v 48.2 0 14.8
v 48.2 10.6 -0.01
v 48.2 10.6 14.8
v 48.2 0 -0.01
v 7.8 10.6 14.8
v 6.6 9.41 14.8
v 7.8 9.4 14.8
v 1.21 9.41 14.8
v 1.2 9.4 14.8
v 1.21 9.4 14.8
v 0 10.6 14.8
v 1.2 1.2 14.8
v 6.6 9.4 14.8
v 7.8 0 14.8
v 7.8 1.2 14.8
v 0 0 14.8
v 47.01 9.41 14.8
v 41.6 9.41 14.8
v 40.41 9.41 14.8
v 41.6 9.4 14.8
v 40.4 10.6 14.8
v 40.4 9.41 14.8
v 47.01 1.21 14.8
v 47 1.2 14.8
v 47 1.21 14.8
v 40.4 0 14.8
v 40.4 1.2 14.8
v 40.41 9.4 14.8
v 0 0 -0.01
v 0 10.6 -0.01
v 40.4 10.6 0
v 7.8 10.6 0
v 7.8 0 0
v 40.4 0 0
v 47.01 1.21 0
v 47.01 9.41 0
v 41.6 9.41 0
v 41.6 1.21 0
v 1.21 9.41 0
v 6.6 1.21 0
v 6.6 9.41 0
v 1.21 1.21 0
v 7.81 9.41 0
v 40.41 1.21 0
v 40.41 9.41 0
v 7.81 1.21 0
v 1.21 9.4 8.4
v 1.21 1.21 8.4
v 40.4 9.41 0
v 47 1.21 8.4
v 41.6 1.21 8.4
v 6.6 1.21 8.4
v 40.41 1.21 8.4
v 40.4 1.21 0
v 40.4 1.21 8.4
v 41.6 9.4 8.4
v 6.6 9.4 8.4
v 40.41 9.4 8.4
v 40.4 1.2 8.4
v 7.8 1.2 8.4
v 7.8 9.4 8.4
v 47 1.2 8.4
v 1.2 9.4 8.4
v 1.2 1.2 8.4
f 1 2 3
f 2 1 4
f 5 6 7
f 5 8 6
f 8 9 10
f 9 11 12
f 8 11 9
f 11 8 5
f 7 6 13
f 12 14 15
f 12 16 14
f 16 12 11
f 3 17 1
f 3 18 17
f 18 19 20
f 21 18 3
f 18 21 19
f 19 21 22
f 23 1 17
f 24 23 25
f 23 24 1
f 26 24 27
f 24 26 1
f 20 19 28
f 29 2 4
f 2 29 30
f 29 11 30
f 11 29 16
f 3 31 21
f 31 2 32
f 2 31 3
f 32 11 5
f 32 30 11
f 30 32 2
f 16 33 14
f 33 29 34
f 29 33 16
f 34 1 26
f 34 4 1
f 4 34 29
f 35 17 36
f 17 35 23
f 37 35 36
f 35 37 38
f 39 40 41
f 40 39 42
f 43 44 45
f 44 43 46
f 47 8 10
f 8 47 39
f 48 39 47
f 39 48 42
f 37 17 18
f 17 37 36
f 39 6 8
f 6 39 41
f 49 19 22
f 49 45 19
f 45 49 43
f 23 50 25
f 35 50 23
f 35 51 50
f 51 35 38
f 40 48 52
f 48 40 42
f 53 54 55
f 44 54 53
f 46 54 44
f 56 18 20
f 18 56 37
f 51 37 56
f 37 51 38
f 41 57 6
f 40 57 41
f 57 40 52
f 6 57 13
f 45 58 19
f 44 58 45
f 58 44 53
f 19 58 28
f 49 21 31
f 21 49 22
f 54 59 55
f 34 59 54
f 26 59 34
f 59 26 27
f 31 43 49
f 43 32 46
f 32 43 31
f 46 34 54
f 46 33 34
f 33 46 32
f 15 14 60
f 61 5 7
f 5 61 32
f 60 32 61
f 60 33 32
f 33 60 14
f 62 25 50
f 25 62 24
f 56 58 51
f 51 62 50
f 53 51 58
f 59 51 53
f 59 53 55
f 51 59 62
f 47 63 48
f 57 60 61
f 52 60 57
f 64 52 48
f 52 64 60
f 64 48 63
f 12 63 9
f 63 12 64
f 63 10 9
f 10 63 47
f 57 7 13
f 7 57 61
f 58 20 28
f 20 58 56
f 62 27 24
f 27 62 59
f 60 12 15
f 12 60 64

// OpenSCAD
// file: ../Base/Boxes.scad
// Fischertechnik Box Foundation
// Pre-designed Boxes

use <Constants.scad>

include <PlacementOptions.scad>

box190Width = 190;
box190Depth = 130;
box130Width = 130;
box130Depth = 95;

// Values are from an original ec3 box
topBottomDifference = 1.5;
outerHeight = 40;
baseThickness = 1.8;
innerHeight = outerHeight - baseThickness;
stackExcess = 5.7;
radius = 3.5;
wallThickness = 1.5;
tolerance = 0.2;

boxWallThickness = wallThickness;
boxBaseThickness = baseThickness;
boxWebWidth = 3.0;

// getBoxWallThickness()
// Gets the wall thickness of a Fischertechnik Box
function getBoxWallThickness() = boxWallThickness;

// getBoxUsageHeight(height = 38.2)
// Gets the usable height of a Fischertechnik box
// height = Outer height of the box from the bottom to the upper edge.
function getBoxUsageHeight(height = outerHeight) = height - baseThickness - stackExcess;

// getBoxInnerHeight()
// Gets the inner height of a Fischertechnik box, including the stack excess
function getBoxInnerHeight() = innerHeight;

// getBoxBaseThickness()
// Gets the thickness of the Fischertechnik box base.
function getBoxBaseThickness() = boxBaseThickness;

// getBoxWebWidth()
// Gets the width of a box web
function getBoxWebWidth() = boxWebWidth;

// getBox190Space()
// Gets the usable inner space of a Box 190 as an x/y-list
function getBox190Space() = [
    box190Width - 2*getBoxWallThickness() - topBottomDifference, 
    box190Depth - 2*getBoxWallThickness() - topBottomDifference ];

// RoundedCornerPlate(width, depth, height, radius)
// Creates a body plate with rounded corners for a box. Used
// also to create the complete box with the hull module.
// width = Width of the plate
// depth = depth of the plate 
// height = thickness of the plate
// radius = radius of the rounded corner
module RoundedCornerPlate(width, depth, height, radius) {
    translate([radius, radius])
    hull() {
        w = width-2*radius;
        d = depth-2*radius;
        cube([w, d, height]);
        cylinder(height, r=radius, $fn=getFragments());
        translate([w, 0])
            cylinder(height, r=radius, $fn=getFragments());
        translate([w, d])
            cylinder(height, r=radius, $fn=getFragments());
        translate([0, d])
            cylinder(height, r=radius, $fn=getFragments());
    }
}

// BoxBase(width, depth)
// Creates an empty stackable Fischertechnik compatible box
// width = Outer width of the box (190, 130, ...)
// depth = Outer depth of the box (130, 95, ...)

module BoxBase(width, depth, height=outerHeight) {    
    thinPlate = 0.01;

    innerHeight = height - baseThickness;    
    
    module Body(tolerance=tolerance) {
        hull() {
            // Bottom with tolerance to fit into the original boxes when stacked
            translate([-wallThickness+tolerance, -wallThickness+tolerance, -baseThickness])
                RoundedCornerPlate(width-topBottomDifference-2*tolerance, depth-topBottomDifference-2*tolerance, thinPlate, radius);
            
            // Top
            translate([-wallThickness-topBottomDifference/2, -wallThickness-topBottomDifference/2, innerHeight-thinPlate])
                RoundedCornerPlate(width, depth, thinPlate, radius);
         }
    }

    module Cutoff() {
        hull() {
            coWidth = width - 2*wallThickness;
            coDepth = depth - 2*wallThickness;
            
            // Bottom
            RoundedCornerPlate(coWidth-topBottomDifference, coDepth-topBottomDifference, thinPlate, radius);

            // Top
            translate([-topBottomDifference/2, -topBottomDifference/2, innerHeight+thinPlate]) 
                RoundedCornerPlate(coWidth, coDepth, thinPlate, radius);
        }
    }
    
    difference() {        
        Body();
        Cutoff();
        stackOffset = innerHeight - stackExcess;
        translate([0, 0, stackOffset + baseThickness])
            Body(tolerance=0);
    }
}

// Creates the Fischertechnik empty box 130x190 mm and places it at position 0,0
// 190x130 are the outer sizes, the inner space is slightly smaller. Use getBox190Space() to get the inner sizes.
// The box is positioned that the usable inner space is at the 0,0,0 position.

module Box190() {
    BoxBase(box190Width, box190Depth);
}

// Gets the usable inner space of a Box 130 as an x/y-list
function getBox130Space() = [
    box130Width - 2*getBoxWallThickness() - topBottomDifference, 
    box130Depth - 2*getBoxWallThickness() - topBottomDifference ];

// Creates the Fischertechnik empty box 95x130 mm and places it at position 0,0
// 190x130 are the outer sizes, the inner space is slightly smaller. Use getBox190Space() to get the inner sizes.
// The box is positioned that the usable inner space is at the 0,0,0 position.

module Box130() {
    BoxBase(box130Width, box130Depth);
}

// Creates a web at the specified box walls
// corner 0 = LowerLeft, 1 = UpperLeft, 2 = UpperRight, 3 = LowerRight
// side 0 = LeftOfCorner, 1 = RightOfCorner
// distance = Distance in mm from the corner
// boxSpace = inner width and depth of the box (default: Box 190)
// webWidth = length of the web (default is 3 mms)
// webThickness = thickness of the web (default is 1 mm)
// height = Height of the web (standard is getBoxUsageHeight())
// sink = How much of the web is sunk into the wall

module BoxWeb(
    corner, 
    side, 
    distance, 
    boxSpace=getBox190Space(), 
    webWidth=getBoxWebWidth(), 
    webThickness=1.0, 
    height=getBoxUsageHeight(),
    sink = getBoxWallThickness()/2) {
    width = (corner % 2 == 0) ? 
            (side == LeftOfCorner ? webWidth : webThickness) :
            (side == LeftOfCorner ? webThickness : webWidth);

    depth = (corner % 2 == 0) ? 
            (side == RightOfCorner ? webWidth : webThickness) :
            (side == RightOfCorner ? webThickness : webWidth);
    
    xDiff = corner == LowerLeft ? 
                (side == LeftOfCorner ? -sink : distance) :
            (corner == UpperLeft ?                
                (side == LeftOfCorner ? distance : -sink) :
            (corner == UpperRight ?
                (side == LeftOfCorner ? boxSpace.x-webWidth+sink : boxSpace.x-distance-webThickness) :
                (side == LeftOfCorner ? boxSpace.x-distance-webThickness: boxSpace.x-webWidth+sink)));

    yDiff = corner == LowerLeft ? 
                (side == RightOfCorner ? -sink : distance) :
            (corner == UpperLeft ?
                (side == RightOfCorner ? boxSpace.y-distance-webThickness : boxSpace.y-webWidth+sink) :
            (corner == UpperRight ?
                (side == RightOfCorner ? boxSpace.y-webWidth+sink : boxSpace.y-distance-webThickness) :
                (side == RightOfCorner ? distance : -sink)));
    
    translate([xDiff, yDiff, -getExcess()])
        cube([width, depth, height + 2*getExcess()]);
}
// file: ../Base/Rotation.scad
// Fischertechnik Box Foundation
// Geometry Helpers Rotation

include <PlacementOptions.scad>

// getRotatedSpace(space, rotation=NoRotation)
// Rotates the space dependent on the specified rotation

function getRotatedSpace(space, rotation=NoRotation) = [
    (rotation == Rotate90 || rotation == Rotate270) ? space.y : space.x,
    (rotation == Rotate90 || rotation == Rotate270) ? space.x : space.y
];

// Rotates the given space around the fixed left lower corner
// space = the space the children needs as width/depth list [width,depth]
// rotation = 0 Rotate0 degrees, 1 Rotate90 degrees, 2 Rotate180 degrees, 3 Rotate270 degrees (equivalent to -90)

module RotateFix(space, rotation=NoRotation) {
    dy = (rotation == Rotate0 || rotation == Rotate270) ? 0 :
        (rotation == Rotate90) ? space.x :
        space.y;
    dx = (rotation < Rotate180) ? 0 :
        (rotation == Rotate180) ? space.x :
        space.y;
    
    translate([dx, dy, 0])
        rotate([0, 0, rotations[rotation]])
            children();
}
// file: ../Base/Alignment.scad
// Fischertechnik Box Foundation
// Geometry Helpers Alignment

include <PlacementOptions.scad>

// getAlignedX(elementWidth, spaceWidth, align=AlignRight, offset=0)
// Gets the aligned X offset of an element with the given
// width in the given space.
// elementWidth = The width of the element to positon
// spaceWidth = The space where the element should be aligned
// align = 0 AlignLeft, 1 AlignCenter, 2 AlignRight
// offset = an optional offset from the aligned position. When
// aligned left or centered, then positive values are in X direction.
// When aligned right then positive values are in negative X direction.

function getAlignedX(elementWidth, spaceWidth, align=AlignRight, offset=0) =
    (align == AlignLeft) ?
        offset :
        ((align == AlignCenter) ?
        (spaceWidth - elementWidth)/2 + offset :
        spaceWidth - offset - elementWidth);

// getAlignedY(elementDepth, spaceDepth, align=AlignTop, offset=0)
// Gets the aligned Y offset of an element with the given
// depth in the given space.
// elementDepth = The depth of the element to positon
// spaceDepth = The space where the element should be aligned
// align = 0 AlignBottom, 1 AlignCenter, 2 AlignTop
// offset = an optional offset from the aligned position. When
// aligned bottom or centered, then positive values are in Y direction.
// When aligned top then positive values are in negative Y direction.

function getAlignedY(elementDepth, spaceDepth, align=AlignTop, offset=0) =
    (align == AlignBottom) ?
        offset :
        ((align == AlignCenter) ?
        (spaceDepth - elementDepth)/2 + offset :
        spaceDepth - offset - elementDepth);
// file: ../Base/PlacementOptions.scad
// Fischertechnik Box Foundation
// Placement Options

// Alignment
NoAlign = 0;
AlignLeft = 1;
AlignBottom = 2;
AlignCenter = 3;
AlignRight = 4;
AlignTop = 5;

// Element rotation degree steps
rotations = [0, -90, -180, -270];

// Rotation
NoRotation = 0;
Rotate0 = 0;
Rotate90 = 1;
Rotate180 = 2;
Rotate270 = 3;

// Docking (seen from above)
NoDock = -1;
DockLeft = 0;
DockTop = 1;
DockRight = 2;
DockCorner = 2;
DockBottom = 3;

// Web corners
LowerLeft = 0;
UpperLeft = 1;
UpperRight = 2;
LowerRight = 3;

// Web position relative to corner
LeftOfCorner = 0;
RightOfCorner = 1;
// file: ../Base/Placement.scad
// Fischertechnik Box Foundation
// Geometry Helpers Placement

use <Constants.scad>
use <Alignment.scad>
use <Rotation.scad>
use <Boxes.scad>

include <PlacementOptions.scad>

// Place(x=0, y=0, elementSpace=[0,0], alignX=AlignLeft, alignY=AlignBottom, rotation=Rotate0, boxSpace=getBox190Space())
// Places the child at the specified position
// y = Y-Position. This is a relative position when an X aligment is specified.
// x = X-Position. This is a relative position when an Y aligment is specified.
// elementSpace = space of the element to be placed [x,y]
// alignX = -1=NoAlign, 0 AlignLeft, 1 AlignCenter, 3 AlignRight (elementSpace and boxSpace required!)
// alignY = -1=NoAlign, 2 AlignBottom, 1 AlignCenter, 4 AlignTop (elementSpace and boxSpace required!)
// rotation = 0 Rotate0 0 degrees, 1 Rotate90 90 degrees, 
// 2 Rotate180 180 degrees, 3 Rotate270 270 degrees (equivalent to -90)
// boxSpace = Inner space of the box where the placement occurs [x,y] - default is Box 190x130 inner space

module Place(x=0, y=0, elementSpace=[0,0], 
  alignX=AlignLeft, alignY=AlignBottom, 
  rotation=NoRotation, boxSpace=getBox190Space()) {

    module Position(x, y, space, rotation=Rotate0) {
        translate([x, y, 0])
            RotateFix(space, rotation)
                children();
    }

    space = getRotatedSpace(elementSpace, rotation);
    alignedX = getAlignedX(space.x, boxSpace.x, alignX, x);
    alignedY = getAlignedY(space.y, boxSpace.y, alignY, y);
    Position(alignedX, alignedY, elementSpace, rotation)
        children();
}

// Center(space=getBox130Space(), elementSpace=[0,0])
// space = Space where the children is centered. For cylinder use centered=true and no elementSpace.
// elementSpace = space of the element to be centered [x,y]

module Center(space=getBox190Space(), elementSpace=[0,0]) {
    Place(elementSpace=elementSpace, boxSpace=space, alignX=AlignCenter, alignY=AlignCenter)
        children();
}

// CenterHorizontal(width=0, y=0, offset=0, space=getBox130Space())
// width = Width of the element to be placed.
// y = Y position of the element
// offset = Offset from the center position (negative will be left of the center)
// space = Space where the element is placed

module CenterHorizontal(width=0, y=0, offset=0, space=getBox190Space()) {
    Place(x=offset, y=y, elementSpace=[width, 0], boxSpace=space, alignX=AlignCenter)
        children(0);
}

// CenterVertical(depth=0, x=0, offset=0, space=getBox130Space())
// depth = Depth of the element to be placed.
// x = X position of the element
// offset = Offset from the center position (negative will be down of the center)
// space = Space where the element is placed

module CenterVertical(depth=0, x=0, offset=0, space=getBox190Space()) {
    Place(x=x, y=offset, elementSpace=[0, depth], boxSpace=space, alignY=AlignCenter)
        children(0);
}

// getIsVertical(align)
// True if the specified alignment needs a vertical orientation for a divider (AlignRight, AlignLeft)

function getIsVertical(align) = (align == AlignRight || align == AlignLeft);

// getIsHorizontal(align)
// True if the specified alignment needs a horizontal orientation for a divider (AlignTop, AlignBottom)

function getIsHorizontal(align) = (align == AlignTop || align == AlignBottom);
// file: ../Base/Constants.scad
// Fischertechnik Box Foundation
// Constants

// Constant values necessary for multiple elements

// Base constants
dividerThickness = 1.2;
excess = 0.01;
fragments = 90;
tolerance = 0.8;

// Gets the thickness of a divider 
function getDividerThickness() = dividerThickness;

// Gets the excess that is used to merge walls into each other
function getExcess() = excess;

// Gets amount of fragments of a cylinder
function getFragments() = fragments;

// Gets the inner tolerance of a frame to each side
function getTolerance() = tolerance;


// Fischertechnik specific constants
axisDiameter = 4;
axisBottomDiameter = axisDiameter + 1;
axisTolerance = 0.2;

// Gets axis diameter of Fischertechnik axis
function getAxisDiameter() = axisDiameter;

// Gets axis diameter tolerance (subtracted for element axis)
function getAxisTolerance() = axisTolerance;

// Gets the axis diameter for standing axis
function getStandAxisDiameter() = getAxisDiameter() - getAxisTolerance();

// Gets axis bottom diameter for thicker part at the bottom
function getAxisBottomDiameter() = axisBottomDiameter;

pinHeight = 2.5;

// gets the height of a connecting pin
function getPinHeight() = pinHeight;

standardEdgeDistance = 2.5;
standardWebDistance = 11.5;
standardCornerLength = 15;

// gets the standard distance to the wall of the box for dockable frames with webs
function getStandardEdgeDistance() = standardEdgeDistance;

// gets the standard distance of each web to the corner of the dockable frame
function getStandardWebDistance() = standardWebDistance;

// gets the standard length of the corner walls of a dockable frame
function getStandardCornerLength() = standardCornerLength;

tubeWallFactor = 0.8;

// gets the wall thickness of a tube.
function getTubeWallThickness() = tubeWallFactor * getDividerThickness();

smallPartsFrameHeight = 20;

// gets the frame height for docked small parts boxes.
function getSmallPartsFrameHeight() = smallPartsFrameHeight;

hubRingDiameter = 19.5;
hubRingLevelDiameter = 21;

// gets the diameter of a tube matching the inner ring of a wheel
function getHubRingDiameter() = hubRingDiameter;

// gets the diameter of a hub tube with a thicker diameter
function getHubRingLevelDiameter() = hubRingLevelDiameter;
// main file
// Fischertechnik Box Library
// Frame for two Connectors 45
// 31330

use <../ModelBase/Complex.scad>

/* [Hidden] */
width = 45;
depth = 8.2;
height = 14.8;

// getFrameTwoConnectors45Space()
// Gets the space needed for the frame for two connectors 45.
function getFrameTwoConnectors45Space() = getElevatedFramesWithCutoffSpace([width, depth, height]);

// FrameTwoConnectors45()
// Frame for two connectors 45

module FrameTwoConnectors45() {    
    bearingLength = 6.6;
    loadHeight = 6.4;
    
    ElevatedFramesWithCutoff([width, depth, loadHeight], depth, height, bearingLength);
}

// Test
color("lightgray")
FrameTwoConnectors45();
